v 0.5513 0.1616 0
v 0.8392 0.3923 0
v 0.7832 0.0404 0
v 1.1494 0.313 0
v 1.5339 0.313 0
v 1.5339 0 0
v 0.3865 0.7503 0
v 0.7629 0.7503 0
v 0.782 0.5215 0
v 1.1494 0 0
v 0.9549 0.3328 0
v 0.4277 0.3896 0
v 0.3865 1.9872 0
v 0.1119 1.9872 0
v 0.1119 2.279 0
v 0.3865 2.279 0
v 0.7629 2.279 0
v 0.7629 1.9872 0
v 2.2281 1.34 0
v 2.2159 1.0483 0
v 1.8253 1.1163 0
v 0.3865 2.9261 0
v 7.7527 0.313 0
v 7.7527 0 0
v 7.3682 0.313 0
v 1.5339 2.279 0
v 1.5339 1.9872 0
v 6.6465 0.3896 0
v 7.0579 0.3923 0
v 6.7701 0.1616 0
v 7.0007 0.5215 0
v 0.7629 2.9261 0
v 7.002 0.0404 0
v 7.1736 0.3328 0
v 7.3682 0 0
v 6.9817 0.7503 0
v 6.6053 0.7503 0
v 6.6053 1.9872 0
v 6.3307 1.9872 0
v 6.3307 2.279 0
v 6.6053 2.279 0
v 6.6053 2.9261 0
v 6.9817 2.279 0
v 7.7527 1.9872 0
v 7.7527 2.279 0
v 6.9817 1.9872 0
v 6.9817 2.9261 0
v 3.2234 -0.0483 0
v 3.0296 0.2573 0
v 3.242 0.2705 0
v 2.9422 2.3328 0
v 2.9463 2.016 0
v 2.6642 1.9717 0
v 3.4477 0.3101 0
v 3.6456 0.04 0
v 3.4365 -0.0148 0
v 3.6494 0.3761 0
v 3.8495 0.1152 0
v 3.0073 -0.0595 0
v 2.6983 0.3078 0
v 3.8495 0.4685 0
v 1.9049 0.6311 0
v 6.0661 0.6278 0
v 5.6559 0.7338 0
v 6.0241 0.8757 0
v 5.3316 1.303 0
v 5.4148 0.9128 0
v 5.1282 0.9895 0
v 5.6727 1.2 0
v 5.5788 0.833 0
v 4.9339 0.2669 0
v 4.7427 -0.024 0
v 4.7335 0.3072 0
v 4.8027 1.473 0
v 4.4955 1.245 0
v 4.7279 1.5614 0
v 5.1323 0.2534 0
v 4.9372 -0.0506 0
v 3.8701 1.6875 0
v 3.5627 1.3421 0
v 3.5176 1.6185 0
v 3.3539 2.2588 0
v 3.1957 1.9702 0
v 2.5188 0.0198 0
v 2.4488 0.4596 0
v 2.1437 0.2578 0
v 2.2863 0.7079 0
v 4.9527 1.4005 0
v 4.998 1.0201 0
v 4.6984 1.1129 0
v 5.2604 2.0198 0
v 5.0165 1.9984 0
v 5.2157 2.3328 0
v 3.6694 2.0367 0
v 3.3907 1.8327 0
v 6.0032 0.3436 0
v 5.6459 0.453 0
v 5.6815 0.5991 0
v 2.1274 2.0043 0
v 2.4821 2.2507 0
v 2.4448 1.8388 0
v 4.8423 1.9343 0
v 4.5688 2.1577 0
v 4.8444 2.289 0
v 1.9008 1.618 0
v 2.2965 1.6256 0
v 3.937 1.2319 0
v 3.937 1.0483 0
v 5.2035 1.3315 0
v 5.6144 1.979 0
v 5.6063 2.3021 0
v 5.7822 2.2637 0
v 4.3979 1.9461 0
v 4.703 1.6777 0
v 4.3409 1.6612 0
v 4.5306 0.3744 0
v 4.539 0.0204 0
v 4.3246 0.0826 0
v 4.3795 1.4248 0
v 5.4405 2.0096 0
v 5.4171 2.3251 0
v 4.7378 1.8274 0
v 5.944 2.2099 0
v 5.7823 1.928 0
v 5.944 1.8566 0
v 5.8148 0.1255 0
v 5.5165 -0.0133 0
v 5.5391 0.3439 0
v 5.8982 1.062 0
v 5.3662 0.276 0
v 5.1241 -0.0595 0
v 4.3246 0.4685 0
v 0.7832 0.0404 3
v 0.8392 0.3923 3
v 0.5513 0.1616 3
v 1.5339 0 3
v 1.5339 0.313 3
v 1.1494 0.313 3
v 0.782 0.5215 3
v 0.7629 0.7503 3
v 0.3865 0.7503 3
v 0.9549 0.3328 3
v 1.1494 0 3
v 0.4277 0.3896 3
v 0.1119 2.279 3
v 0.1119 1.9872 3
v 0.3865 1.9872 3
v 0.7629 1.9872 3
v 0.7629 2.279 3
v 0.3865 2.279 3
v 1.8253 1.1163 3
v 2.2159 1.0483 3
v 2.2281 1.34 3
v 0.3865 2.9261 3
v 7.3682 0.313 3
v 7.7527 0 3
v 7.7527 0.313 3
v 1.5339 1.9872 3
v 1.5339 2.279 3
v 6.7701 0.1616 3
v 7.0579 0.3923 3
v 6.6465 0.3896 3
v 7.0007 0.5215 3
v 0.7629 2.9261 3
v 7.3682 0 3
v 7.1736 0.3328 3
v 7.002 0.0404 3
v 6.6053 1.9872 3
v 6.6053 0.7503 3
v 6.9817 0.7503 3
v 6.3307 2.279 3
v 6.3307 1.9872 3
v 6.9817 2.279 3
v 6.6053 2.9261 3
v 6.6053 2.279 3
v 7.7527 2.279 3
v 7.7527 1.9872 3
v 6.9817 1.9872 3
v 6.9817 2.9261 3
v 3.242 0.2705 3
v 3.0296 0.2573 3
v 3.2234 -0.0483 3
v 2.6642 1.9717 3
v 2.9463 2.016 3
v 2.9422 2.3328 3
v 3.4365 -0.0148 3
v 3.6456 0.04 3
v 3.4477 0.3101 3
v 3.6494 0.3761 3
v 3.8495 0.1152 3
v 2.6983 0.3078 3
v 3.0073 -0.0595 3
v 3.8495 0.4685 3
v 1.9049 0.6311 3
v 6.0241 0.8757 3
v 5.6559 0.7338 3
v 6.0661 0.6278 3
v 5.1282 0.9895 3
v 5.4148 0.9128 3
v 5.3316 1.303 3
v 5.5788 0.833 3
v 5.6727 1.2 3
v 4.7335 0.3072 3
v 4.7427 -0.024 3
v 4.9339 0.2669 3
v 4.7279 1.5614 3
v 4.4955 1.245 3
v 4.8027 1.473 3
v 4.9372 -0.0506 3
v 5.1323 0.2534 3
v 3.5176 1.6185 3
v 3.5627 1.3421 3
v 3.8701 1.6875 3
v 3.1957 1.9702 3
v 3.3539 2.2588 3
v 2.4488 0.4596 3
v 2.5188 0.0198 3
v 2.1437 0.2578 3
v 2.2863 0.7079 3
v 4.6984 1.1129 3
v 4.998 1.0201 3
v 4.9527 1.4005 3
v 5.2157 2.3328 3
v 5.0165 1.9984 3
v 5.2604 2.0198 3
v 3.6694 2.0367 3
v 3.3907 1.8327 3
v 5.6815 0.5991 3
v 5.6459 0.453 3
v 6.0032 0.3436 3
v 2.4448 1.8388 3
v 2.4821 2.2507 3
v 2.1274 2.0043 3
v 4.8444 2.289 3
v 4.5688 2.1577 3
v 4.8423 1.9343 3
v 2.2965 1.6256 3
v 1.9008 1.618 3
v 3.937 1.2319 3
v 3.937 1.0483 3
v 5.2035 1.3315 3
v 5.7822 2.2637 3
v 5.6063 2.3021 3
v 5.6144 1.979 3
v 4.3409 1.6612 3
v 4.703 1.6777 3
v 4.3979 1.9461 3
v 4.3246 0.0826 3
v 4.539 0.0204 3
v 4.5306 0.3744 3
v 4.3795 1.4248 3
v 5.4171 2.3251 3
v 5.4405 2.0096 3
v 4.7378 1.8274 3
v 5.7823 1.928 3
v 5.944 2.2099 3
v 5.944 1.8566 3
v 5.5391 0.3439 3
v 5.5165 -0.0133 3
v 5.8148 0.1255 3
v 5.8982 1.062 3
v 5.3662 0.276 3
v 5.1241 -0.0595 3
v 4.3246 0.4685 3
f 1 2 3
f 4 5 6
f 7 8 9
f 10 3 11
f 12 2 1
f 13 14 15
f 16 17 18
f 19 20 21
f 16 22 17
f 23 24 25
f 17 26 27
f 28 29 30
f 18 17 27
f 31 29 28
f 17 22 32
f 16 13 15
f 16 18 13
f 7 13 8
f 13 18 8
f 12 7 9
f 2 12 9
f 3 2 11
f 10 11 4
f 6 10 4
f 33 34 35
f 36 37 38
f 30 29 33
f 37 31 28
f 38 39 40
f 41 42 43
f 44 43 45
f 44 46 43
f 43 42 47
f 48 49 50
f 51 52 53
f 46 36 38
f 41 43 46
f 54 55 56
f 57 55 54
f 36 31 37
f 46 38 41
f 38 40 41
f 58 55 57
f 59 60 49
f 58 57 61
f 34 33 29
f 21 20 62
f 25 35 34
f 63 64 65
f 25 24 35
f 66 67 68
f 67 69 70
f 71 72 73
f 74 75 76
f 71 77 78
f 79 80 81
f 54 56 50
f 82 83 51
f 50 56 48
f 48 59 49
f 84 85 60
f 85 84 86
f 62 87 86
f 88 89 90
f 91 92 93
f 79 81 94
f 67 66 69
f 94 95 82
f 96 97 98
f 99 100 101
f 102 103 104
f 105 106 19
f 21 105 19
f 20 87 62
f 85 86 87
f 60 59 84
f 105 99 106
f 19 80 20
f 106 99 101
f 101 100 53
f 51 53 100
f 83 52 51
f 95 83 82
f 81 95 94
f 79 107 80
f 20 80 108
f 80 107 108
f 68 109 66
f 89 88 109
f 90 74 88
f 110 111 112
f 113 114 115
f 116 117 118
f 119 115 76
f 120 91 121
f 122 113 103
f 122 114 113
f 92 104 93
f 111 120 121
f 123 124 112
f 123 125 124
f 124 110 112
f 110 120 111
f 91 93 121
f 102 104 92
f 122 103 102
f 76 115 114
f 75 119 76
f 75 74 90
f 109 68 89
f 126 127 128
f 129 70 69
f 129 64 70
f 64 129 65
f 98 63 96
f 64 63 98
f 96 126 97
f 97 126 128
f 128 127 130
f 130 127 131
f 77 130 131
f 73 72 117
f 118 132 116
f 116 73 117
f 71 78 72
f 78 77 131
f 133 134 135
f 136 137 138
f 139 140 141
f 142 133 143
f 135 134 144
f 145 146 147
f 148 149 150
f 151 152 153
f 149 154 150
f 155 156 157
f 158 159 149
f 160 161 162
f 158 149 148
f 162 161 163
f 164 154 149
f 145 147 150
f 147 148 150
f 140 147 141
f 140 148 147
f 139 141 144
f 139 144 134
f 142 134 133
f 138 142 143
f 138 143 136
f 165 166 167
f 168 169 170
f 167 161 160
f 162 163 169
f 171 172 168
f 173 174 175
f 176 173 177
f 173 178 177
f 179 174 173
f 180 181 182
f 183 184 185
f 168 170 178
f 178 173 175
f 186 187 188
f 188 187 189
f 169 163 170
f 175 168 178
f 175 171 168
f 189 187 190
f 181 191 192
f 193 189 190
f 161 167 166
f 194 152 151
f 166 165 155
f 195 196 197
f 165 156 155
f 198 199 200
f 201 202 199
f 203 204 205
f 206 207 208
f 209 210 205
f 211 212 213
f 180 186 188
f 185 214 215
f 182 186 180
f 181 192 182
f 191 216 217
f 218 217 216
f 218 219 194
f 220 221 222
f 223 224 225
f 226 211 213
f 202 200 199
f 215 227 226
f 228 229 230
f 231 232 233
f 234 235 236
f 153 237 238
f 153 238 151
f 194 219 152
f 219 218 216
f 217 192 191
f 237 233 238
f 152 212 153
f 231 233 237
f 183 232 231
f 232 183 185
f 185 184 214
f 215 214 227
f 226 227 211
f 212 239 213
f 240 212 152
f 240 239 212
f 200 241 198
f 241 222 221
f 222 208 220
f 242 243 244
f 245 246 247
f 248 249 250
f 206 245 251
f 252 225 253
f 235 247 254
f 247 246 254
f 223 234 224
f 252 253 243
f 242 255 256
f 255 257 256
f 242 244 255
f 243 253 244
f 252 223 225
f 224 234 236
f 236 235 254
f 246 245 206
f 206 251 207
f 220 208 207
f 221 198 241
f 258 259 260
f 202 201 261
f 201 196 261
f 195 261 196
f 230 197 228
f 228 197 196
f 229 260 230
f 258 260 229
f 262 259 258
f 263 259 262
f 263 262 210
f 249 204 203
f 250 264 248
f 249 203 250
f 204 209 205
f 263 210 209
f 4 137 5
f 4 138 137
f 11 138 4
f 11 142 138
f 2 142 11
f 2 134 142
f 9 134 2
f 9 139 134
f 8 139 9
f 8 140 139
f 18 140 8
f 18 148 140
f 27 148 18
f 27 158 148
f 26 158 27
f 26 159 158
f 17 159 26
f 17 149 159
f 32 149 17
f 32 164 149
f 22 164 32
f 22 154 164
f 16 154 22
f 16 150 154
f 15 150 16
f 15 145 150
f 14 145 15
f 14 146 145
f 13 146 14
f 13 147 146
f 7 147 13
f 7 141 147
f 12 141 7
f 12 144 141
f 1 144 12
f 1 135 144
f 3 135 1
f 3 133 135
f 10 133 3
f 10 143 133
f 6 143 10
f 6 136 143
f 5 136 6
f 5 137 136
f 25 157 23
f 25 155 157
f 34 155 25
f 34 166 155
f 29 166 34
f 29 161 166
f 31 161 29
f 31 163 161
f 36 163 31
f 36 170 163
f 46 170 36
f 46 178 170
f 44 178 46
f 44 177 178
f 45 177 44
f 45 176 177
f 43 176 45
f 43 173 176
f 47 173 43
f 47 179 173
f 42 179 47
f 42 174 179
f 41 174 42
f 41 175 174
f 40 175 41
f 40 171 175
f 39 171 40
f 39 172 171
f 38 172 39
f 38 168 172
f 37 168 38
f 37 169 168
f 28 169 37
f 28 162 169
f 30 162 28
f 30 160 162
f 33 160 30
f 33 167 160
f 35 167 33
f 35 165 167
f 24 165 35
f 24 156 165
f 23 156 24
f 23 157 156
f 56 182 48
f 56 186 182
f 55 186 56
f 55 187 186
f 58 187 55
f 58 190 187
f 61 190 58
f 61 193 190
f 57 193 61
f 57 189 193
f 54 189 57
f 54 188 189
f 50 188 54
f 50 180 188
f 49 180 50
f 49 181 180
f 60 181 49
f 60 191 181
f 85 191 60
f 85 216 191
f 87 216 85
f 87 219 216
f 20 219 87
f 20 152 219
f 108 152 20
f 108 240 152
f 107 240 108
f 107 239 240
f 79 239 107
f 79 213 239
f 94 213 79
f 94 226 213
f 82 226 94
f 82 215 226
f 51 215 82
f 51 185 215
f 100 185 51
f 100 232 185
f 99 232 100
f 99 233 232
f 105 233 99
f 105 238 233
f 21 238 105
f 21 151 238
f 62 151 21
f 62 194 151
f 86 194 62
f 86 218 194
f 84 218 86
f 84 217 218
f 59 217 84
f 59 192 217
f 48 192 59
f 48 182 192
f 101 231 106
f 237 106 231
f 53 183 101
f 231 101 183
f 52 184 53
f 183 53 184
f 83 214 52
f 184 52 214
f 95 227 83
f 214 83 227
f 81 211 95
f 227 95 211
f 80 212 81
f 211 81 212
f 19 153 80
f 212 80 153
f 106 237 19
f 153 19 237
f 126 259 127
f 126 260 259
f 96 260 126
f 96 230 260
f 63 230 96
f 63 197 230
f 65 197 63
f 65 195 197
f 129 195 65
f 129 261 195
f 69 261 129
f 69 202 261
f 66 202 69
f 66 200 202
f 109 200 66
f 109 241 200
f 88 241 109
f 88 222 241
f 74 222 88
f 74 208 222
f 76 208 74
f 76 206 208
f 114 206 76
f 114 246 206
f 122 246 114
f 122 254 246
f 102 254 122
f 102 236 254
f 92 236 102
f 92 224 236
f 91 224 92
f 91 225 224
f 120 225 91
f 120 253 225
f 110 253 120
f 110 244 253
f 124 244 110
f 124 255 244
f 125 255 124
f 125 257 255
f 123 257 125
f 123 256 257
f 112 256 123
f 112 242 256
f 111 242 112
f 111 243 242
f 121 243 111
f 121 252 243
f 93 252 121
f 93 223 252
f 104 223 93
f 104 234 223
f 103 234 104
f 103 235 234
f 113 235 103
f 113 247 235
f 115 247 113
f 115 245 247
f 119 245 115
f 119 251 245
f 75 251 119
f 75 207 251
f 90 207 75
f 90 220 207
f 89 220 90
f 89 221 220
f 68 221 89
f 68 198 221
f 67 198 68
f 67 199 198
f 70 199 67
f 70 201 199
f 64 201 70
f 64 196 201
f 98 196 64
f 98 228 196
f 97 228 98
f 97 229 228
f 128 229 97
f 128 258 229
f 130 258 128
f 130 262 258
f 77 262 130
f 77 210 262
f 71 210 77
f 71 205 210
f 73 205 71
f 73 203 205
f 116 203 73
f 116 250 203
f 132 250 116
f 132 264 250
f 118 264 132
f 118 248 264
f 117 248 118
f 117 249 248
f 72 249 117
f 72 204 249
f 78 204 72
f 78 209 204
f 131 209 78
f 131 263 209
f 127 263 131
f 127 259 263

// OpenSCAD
texte_a_inserer = "test"; 
taille = 3; 
police = "Alegreya"; //[[Abril Fatface,Aclonica,Acme,Advent Pro,Akronim,Aladin,Alegreya,Alegreya Sans,Alegreya SC,Alex Brush,Alfa Slab One,Alice,Amaranth,Architects Daughter,Archivo Black,Archivo Narrow,Arimo,Arvo,Asap,Astloch,Asul,Averia Libre,Averia Serif Libre,Bangers,Basic,Belgrano,Berkshire Swash,Bigshot One,Bilbo Swash Caps,Black Ops One,Bonbon,Bowlby One SC,Brawler,Bubblegum Sans,Butterfly Kids,Cabin Condensed,Caesar Dressing,Cagliostro,Calligraffitti,Capriola,Carter One,Changa One,Chango,Chelsea Market,Cherry Cream Soda,Chewy,Chicle,Chivo,Clicker Script,Coming Soon,Concert One,Condiment,Cookie,Courgette,Covered By Your Grace,Crimson Text,Dancing Script,DejaVu Sans,DejaVu Serif,Dhurjati,Doppio One,Dosis,Droid Sans,Eagle Lake,Electrolize,Emilys Candy,Encode Sans,Encode Sans Compressed,Euphoria Script,Exo,Exo 2,Faster One,Federo,Finger Paint,Fjord One,Fontdiner Swanky,Freckle Face,Fruktur,Gabriela,Geo,Germania One,Give You Glory,Gloria Hallelujah,Goudy Bookletter 1911,Graduate,Grand Hotel,Great Vibes,Griffy,Hanalei Fill,Happy Monkey,Henny Penny,Hind,IM Fell English SC,Indie Flower,Irish Grover,Italianno,Jacques Francois Shadow,Jolly Lodger,Josefin Slab,Joti One,Judson,Just Another Hand,Kalam,Kameron,Karma,Kavoon,Knewave,Kranky,Kristi,Laila,Lakki Reddy,Lancelot,Lato,Leckerli One,Ledger,Lekton,Lemon One,Liberation Sans,Libre Caslon Text,Life Savers,Lilita One,Lily Script One,Limelight,Lobster,Lobster Two,Londrina Outline,Londrina Shadow,Londrina Solid,Lora,Love Ya Like A Sister,Loved by the King,Lovers Quarrel,Luckiest Guy,Lusitana,Macondo,Macondo Swash Caps,Mako,Marck Script,Margarine,Marko One,Maven Pro,McLaren,MedievalSharp,Merienda One,Merriweather,Mervale Script,Metal Mania,Metrophobic,Milonga,Miltonian Tattoo,Miss Fajardose,Molle,Montez,Montserrat,Mr De Haviland,Mystery Quest,Neucha,New Rocker,Niconne,Nosifer,Nothing You Could Do,Noto Sans Oriya,Noto Serif,Nova Square,Nunito,Old Standard TT,Oleo Script,Oleo Script Swash Caps,Orbitron,Oregano,Orienta,Original Surfer,Oswald,Over the Rainbow,Overlock,Oxygen,Pacifico,Paprika,Parisienne,Patrick Hand SC,Paytone One,Peralta,Permanent Marker,Piedra,Pirata One,Play,Playball,Poetsen One,Poppins,Press Start 2P,Princess Sofia,PT Mono,Qwigley,Racing Sans One,Raleway,Rancho,Ranga,Ribeye,Roboto,Roboto Condensed,Roboto Slab,Rochester,Rock Salt,Rubik One,Sail,Salsa,Sansita One,Sarina,Satisfy,Schoolbell,Seaweed Script,Sevillana,Shadows Into Light,Shadows Into Light Two,Share,Six Caps,Skranji,Source Sans Pro,Spicy Rice,Stardos Stencil,Stoke,Syncopate,Teko,Terminal Dosis,The Girl Next Door,Tillana,Timmana,Titillium Web,Ubuntu,Ultra,Underdog,UnifrakturCook,UnifrakturMaguntia,Vampiro One,Vidaloka,Viga,Voces,Volkhov,Vollkorn,Voltaire,Waiting for the Sunrise,Wallpoet,Wellfleet,Wendy One,Yellowtail,Yesteryear,Zeyada]]
hauteur = 3; 
module rendu(){
linear_extrude(hauteur) text(texte_a_inserer,size = taille, font = police);
}
rendu();
 
